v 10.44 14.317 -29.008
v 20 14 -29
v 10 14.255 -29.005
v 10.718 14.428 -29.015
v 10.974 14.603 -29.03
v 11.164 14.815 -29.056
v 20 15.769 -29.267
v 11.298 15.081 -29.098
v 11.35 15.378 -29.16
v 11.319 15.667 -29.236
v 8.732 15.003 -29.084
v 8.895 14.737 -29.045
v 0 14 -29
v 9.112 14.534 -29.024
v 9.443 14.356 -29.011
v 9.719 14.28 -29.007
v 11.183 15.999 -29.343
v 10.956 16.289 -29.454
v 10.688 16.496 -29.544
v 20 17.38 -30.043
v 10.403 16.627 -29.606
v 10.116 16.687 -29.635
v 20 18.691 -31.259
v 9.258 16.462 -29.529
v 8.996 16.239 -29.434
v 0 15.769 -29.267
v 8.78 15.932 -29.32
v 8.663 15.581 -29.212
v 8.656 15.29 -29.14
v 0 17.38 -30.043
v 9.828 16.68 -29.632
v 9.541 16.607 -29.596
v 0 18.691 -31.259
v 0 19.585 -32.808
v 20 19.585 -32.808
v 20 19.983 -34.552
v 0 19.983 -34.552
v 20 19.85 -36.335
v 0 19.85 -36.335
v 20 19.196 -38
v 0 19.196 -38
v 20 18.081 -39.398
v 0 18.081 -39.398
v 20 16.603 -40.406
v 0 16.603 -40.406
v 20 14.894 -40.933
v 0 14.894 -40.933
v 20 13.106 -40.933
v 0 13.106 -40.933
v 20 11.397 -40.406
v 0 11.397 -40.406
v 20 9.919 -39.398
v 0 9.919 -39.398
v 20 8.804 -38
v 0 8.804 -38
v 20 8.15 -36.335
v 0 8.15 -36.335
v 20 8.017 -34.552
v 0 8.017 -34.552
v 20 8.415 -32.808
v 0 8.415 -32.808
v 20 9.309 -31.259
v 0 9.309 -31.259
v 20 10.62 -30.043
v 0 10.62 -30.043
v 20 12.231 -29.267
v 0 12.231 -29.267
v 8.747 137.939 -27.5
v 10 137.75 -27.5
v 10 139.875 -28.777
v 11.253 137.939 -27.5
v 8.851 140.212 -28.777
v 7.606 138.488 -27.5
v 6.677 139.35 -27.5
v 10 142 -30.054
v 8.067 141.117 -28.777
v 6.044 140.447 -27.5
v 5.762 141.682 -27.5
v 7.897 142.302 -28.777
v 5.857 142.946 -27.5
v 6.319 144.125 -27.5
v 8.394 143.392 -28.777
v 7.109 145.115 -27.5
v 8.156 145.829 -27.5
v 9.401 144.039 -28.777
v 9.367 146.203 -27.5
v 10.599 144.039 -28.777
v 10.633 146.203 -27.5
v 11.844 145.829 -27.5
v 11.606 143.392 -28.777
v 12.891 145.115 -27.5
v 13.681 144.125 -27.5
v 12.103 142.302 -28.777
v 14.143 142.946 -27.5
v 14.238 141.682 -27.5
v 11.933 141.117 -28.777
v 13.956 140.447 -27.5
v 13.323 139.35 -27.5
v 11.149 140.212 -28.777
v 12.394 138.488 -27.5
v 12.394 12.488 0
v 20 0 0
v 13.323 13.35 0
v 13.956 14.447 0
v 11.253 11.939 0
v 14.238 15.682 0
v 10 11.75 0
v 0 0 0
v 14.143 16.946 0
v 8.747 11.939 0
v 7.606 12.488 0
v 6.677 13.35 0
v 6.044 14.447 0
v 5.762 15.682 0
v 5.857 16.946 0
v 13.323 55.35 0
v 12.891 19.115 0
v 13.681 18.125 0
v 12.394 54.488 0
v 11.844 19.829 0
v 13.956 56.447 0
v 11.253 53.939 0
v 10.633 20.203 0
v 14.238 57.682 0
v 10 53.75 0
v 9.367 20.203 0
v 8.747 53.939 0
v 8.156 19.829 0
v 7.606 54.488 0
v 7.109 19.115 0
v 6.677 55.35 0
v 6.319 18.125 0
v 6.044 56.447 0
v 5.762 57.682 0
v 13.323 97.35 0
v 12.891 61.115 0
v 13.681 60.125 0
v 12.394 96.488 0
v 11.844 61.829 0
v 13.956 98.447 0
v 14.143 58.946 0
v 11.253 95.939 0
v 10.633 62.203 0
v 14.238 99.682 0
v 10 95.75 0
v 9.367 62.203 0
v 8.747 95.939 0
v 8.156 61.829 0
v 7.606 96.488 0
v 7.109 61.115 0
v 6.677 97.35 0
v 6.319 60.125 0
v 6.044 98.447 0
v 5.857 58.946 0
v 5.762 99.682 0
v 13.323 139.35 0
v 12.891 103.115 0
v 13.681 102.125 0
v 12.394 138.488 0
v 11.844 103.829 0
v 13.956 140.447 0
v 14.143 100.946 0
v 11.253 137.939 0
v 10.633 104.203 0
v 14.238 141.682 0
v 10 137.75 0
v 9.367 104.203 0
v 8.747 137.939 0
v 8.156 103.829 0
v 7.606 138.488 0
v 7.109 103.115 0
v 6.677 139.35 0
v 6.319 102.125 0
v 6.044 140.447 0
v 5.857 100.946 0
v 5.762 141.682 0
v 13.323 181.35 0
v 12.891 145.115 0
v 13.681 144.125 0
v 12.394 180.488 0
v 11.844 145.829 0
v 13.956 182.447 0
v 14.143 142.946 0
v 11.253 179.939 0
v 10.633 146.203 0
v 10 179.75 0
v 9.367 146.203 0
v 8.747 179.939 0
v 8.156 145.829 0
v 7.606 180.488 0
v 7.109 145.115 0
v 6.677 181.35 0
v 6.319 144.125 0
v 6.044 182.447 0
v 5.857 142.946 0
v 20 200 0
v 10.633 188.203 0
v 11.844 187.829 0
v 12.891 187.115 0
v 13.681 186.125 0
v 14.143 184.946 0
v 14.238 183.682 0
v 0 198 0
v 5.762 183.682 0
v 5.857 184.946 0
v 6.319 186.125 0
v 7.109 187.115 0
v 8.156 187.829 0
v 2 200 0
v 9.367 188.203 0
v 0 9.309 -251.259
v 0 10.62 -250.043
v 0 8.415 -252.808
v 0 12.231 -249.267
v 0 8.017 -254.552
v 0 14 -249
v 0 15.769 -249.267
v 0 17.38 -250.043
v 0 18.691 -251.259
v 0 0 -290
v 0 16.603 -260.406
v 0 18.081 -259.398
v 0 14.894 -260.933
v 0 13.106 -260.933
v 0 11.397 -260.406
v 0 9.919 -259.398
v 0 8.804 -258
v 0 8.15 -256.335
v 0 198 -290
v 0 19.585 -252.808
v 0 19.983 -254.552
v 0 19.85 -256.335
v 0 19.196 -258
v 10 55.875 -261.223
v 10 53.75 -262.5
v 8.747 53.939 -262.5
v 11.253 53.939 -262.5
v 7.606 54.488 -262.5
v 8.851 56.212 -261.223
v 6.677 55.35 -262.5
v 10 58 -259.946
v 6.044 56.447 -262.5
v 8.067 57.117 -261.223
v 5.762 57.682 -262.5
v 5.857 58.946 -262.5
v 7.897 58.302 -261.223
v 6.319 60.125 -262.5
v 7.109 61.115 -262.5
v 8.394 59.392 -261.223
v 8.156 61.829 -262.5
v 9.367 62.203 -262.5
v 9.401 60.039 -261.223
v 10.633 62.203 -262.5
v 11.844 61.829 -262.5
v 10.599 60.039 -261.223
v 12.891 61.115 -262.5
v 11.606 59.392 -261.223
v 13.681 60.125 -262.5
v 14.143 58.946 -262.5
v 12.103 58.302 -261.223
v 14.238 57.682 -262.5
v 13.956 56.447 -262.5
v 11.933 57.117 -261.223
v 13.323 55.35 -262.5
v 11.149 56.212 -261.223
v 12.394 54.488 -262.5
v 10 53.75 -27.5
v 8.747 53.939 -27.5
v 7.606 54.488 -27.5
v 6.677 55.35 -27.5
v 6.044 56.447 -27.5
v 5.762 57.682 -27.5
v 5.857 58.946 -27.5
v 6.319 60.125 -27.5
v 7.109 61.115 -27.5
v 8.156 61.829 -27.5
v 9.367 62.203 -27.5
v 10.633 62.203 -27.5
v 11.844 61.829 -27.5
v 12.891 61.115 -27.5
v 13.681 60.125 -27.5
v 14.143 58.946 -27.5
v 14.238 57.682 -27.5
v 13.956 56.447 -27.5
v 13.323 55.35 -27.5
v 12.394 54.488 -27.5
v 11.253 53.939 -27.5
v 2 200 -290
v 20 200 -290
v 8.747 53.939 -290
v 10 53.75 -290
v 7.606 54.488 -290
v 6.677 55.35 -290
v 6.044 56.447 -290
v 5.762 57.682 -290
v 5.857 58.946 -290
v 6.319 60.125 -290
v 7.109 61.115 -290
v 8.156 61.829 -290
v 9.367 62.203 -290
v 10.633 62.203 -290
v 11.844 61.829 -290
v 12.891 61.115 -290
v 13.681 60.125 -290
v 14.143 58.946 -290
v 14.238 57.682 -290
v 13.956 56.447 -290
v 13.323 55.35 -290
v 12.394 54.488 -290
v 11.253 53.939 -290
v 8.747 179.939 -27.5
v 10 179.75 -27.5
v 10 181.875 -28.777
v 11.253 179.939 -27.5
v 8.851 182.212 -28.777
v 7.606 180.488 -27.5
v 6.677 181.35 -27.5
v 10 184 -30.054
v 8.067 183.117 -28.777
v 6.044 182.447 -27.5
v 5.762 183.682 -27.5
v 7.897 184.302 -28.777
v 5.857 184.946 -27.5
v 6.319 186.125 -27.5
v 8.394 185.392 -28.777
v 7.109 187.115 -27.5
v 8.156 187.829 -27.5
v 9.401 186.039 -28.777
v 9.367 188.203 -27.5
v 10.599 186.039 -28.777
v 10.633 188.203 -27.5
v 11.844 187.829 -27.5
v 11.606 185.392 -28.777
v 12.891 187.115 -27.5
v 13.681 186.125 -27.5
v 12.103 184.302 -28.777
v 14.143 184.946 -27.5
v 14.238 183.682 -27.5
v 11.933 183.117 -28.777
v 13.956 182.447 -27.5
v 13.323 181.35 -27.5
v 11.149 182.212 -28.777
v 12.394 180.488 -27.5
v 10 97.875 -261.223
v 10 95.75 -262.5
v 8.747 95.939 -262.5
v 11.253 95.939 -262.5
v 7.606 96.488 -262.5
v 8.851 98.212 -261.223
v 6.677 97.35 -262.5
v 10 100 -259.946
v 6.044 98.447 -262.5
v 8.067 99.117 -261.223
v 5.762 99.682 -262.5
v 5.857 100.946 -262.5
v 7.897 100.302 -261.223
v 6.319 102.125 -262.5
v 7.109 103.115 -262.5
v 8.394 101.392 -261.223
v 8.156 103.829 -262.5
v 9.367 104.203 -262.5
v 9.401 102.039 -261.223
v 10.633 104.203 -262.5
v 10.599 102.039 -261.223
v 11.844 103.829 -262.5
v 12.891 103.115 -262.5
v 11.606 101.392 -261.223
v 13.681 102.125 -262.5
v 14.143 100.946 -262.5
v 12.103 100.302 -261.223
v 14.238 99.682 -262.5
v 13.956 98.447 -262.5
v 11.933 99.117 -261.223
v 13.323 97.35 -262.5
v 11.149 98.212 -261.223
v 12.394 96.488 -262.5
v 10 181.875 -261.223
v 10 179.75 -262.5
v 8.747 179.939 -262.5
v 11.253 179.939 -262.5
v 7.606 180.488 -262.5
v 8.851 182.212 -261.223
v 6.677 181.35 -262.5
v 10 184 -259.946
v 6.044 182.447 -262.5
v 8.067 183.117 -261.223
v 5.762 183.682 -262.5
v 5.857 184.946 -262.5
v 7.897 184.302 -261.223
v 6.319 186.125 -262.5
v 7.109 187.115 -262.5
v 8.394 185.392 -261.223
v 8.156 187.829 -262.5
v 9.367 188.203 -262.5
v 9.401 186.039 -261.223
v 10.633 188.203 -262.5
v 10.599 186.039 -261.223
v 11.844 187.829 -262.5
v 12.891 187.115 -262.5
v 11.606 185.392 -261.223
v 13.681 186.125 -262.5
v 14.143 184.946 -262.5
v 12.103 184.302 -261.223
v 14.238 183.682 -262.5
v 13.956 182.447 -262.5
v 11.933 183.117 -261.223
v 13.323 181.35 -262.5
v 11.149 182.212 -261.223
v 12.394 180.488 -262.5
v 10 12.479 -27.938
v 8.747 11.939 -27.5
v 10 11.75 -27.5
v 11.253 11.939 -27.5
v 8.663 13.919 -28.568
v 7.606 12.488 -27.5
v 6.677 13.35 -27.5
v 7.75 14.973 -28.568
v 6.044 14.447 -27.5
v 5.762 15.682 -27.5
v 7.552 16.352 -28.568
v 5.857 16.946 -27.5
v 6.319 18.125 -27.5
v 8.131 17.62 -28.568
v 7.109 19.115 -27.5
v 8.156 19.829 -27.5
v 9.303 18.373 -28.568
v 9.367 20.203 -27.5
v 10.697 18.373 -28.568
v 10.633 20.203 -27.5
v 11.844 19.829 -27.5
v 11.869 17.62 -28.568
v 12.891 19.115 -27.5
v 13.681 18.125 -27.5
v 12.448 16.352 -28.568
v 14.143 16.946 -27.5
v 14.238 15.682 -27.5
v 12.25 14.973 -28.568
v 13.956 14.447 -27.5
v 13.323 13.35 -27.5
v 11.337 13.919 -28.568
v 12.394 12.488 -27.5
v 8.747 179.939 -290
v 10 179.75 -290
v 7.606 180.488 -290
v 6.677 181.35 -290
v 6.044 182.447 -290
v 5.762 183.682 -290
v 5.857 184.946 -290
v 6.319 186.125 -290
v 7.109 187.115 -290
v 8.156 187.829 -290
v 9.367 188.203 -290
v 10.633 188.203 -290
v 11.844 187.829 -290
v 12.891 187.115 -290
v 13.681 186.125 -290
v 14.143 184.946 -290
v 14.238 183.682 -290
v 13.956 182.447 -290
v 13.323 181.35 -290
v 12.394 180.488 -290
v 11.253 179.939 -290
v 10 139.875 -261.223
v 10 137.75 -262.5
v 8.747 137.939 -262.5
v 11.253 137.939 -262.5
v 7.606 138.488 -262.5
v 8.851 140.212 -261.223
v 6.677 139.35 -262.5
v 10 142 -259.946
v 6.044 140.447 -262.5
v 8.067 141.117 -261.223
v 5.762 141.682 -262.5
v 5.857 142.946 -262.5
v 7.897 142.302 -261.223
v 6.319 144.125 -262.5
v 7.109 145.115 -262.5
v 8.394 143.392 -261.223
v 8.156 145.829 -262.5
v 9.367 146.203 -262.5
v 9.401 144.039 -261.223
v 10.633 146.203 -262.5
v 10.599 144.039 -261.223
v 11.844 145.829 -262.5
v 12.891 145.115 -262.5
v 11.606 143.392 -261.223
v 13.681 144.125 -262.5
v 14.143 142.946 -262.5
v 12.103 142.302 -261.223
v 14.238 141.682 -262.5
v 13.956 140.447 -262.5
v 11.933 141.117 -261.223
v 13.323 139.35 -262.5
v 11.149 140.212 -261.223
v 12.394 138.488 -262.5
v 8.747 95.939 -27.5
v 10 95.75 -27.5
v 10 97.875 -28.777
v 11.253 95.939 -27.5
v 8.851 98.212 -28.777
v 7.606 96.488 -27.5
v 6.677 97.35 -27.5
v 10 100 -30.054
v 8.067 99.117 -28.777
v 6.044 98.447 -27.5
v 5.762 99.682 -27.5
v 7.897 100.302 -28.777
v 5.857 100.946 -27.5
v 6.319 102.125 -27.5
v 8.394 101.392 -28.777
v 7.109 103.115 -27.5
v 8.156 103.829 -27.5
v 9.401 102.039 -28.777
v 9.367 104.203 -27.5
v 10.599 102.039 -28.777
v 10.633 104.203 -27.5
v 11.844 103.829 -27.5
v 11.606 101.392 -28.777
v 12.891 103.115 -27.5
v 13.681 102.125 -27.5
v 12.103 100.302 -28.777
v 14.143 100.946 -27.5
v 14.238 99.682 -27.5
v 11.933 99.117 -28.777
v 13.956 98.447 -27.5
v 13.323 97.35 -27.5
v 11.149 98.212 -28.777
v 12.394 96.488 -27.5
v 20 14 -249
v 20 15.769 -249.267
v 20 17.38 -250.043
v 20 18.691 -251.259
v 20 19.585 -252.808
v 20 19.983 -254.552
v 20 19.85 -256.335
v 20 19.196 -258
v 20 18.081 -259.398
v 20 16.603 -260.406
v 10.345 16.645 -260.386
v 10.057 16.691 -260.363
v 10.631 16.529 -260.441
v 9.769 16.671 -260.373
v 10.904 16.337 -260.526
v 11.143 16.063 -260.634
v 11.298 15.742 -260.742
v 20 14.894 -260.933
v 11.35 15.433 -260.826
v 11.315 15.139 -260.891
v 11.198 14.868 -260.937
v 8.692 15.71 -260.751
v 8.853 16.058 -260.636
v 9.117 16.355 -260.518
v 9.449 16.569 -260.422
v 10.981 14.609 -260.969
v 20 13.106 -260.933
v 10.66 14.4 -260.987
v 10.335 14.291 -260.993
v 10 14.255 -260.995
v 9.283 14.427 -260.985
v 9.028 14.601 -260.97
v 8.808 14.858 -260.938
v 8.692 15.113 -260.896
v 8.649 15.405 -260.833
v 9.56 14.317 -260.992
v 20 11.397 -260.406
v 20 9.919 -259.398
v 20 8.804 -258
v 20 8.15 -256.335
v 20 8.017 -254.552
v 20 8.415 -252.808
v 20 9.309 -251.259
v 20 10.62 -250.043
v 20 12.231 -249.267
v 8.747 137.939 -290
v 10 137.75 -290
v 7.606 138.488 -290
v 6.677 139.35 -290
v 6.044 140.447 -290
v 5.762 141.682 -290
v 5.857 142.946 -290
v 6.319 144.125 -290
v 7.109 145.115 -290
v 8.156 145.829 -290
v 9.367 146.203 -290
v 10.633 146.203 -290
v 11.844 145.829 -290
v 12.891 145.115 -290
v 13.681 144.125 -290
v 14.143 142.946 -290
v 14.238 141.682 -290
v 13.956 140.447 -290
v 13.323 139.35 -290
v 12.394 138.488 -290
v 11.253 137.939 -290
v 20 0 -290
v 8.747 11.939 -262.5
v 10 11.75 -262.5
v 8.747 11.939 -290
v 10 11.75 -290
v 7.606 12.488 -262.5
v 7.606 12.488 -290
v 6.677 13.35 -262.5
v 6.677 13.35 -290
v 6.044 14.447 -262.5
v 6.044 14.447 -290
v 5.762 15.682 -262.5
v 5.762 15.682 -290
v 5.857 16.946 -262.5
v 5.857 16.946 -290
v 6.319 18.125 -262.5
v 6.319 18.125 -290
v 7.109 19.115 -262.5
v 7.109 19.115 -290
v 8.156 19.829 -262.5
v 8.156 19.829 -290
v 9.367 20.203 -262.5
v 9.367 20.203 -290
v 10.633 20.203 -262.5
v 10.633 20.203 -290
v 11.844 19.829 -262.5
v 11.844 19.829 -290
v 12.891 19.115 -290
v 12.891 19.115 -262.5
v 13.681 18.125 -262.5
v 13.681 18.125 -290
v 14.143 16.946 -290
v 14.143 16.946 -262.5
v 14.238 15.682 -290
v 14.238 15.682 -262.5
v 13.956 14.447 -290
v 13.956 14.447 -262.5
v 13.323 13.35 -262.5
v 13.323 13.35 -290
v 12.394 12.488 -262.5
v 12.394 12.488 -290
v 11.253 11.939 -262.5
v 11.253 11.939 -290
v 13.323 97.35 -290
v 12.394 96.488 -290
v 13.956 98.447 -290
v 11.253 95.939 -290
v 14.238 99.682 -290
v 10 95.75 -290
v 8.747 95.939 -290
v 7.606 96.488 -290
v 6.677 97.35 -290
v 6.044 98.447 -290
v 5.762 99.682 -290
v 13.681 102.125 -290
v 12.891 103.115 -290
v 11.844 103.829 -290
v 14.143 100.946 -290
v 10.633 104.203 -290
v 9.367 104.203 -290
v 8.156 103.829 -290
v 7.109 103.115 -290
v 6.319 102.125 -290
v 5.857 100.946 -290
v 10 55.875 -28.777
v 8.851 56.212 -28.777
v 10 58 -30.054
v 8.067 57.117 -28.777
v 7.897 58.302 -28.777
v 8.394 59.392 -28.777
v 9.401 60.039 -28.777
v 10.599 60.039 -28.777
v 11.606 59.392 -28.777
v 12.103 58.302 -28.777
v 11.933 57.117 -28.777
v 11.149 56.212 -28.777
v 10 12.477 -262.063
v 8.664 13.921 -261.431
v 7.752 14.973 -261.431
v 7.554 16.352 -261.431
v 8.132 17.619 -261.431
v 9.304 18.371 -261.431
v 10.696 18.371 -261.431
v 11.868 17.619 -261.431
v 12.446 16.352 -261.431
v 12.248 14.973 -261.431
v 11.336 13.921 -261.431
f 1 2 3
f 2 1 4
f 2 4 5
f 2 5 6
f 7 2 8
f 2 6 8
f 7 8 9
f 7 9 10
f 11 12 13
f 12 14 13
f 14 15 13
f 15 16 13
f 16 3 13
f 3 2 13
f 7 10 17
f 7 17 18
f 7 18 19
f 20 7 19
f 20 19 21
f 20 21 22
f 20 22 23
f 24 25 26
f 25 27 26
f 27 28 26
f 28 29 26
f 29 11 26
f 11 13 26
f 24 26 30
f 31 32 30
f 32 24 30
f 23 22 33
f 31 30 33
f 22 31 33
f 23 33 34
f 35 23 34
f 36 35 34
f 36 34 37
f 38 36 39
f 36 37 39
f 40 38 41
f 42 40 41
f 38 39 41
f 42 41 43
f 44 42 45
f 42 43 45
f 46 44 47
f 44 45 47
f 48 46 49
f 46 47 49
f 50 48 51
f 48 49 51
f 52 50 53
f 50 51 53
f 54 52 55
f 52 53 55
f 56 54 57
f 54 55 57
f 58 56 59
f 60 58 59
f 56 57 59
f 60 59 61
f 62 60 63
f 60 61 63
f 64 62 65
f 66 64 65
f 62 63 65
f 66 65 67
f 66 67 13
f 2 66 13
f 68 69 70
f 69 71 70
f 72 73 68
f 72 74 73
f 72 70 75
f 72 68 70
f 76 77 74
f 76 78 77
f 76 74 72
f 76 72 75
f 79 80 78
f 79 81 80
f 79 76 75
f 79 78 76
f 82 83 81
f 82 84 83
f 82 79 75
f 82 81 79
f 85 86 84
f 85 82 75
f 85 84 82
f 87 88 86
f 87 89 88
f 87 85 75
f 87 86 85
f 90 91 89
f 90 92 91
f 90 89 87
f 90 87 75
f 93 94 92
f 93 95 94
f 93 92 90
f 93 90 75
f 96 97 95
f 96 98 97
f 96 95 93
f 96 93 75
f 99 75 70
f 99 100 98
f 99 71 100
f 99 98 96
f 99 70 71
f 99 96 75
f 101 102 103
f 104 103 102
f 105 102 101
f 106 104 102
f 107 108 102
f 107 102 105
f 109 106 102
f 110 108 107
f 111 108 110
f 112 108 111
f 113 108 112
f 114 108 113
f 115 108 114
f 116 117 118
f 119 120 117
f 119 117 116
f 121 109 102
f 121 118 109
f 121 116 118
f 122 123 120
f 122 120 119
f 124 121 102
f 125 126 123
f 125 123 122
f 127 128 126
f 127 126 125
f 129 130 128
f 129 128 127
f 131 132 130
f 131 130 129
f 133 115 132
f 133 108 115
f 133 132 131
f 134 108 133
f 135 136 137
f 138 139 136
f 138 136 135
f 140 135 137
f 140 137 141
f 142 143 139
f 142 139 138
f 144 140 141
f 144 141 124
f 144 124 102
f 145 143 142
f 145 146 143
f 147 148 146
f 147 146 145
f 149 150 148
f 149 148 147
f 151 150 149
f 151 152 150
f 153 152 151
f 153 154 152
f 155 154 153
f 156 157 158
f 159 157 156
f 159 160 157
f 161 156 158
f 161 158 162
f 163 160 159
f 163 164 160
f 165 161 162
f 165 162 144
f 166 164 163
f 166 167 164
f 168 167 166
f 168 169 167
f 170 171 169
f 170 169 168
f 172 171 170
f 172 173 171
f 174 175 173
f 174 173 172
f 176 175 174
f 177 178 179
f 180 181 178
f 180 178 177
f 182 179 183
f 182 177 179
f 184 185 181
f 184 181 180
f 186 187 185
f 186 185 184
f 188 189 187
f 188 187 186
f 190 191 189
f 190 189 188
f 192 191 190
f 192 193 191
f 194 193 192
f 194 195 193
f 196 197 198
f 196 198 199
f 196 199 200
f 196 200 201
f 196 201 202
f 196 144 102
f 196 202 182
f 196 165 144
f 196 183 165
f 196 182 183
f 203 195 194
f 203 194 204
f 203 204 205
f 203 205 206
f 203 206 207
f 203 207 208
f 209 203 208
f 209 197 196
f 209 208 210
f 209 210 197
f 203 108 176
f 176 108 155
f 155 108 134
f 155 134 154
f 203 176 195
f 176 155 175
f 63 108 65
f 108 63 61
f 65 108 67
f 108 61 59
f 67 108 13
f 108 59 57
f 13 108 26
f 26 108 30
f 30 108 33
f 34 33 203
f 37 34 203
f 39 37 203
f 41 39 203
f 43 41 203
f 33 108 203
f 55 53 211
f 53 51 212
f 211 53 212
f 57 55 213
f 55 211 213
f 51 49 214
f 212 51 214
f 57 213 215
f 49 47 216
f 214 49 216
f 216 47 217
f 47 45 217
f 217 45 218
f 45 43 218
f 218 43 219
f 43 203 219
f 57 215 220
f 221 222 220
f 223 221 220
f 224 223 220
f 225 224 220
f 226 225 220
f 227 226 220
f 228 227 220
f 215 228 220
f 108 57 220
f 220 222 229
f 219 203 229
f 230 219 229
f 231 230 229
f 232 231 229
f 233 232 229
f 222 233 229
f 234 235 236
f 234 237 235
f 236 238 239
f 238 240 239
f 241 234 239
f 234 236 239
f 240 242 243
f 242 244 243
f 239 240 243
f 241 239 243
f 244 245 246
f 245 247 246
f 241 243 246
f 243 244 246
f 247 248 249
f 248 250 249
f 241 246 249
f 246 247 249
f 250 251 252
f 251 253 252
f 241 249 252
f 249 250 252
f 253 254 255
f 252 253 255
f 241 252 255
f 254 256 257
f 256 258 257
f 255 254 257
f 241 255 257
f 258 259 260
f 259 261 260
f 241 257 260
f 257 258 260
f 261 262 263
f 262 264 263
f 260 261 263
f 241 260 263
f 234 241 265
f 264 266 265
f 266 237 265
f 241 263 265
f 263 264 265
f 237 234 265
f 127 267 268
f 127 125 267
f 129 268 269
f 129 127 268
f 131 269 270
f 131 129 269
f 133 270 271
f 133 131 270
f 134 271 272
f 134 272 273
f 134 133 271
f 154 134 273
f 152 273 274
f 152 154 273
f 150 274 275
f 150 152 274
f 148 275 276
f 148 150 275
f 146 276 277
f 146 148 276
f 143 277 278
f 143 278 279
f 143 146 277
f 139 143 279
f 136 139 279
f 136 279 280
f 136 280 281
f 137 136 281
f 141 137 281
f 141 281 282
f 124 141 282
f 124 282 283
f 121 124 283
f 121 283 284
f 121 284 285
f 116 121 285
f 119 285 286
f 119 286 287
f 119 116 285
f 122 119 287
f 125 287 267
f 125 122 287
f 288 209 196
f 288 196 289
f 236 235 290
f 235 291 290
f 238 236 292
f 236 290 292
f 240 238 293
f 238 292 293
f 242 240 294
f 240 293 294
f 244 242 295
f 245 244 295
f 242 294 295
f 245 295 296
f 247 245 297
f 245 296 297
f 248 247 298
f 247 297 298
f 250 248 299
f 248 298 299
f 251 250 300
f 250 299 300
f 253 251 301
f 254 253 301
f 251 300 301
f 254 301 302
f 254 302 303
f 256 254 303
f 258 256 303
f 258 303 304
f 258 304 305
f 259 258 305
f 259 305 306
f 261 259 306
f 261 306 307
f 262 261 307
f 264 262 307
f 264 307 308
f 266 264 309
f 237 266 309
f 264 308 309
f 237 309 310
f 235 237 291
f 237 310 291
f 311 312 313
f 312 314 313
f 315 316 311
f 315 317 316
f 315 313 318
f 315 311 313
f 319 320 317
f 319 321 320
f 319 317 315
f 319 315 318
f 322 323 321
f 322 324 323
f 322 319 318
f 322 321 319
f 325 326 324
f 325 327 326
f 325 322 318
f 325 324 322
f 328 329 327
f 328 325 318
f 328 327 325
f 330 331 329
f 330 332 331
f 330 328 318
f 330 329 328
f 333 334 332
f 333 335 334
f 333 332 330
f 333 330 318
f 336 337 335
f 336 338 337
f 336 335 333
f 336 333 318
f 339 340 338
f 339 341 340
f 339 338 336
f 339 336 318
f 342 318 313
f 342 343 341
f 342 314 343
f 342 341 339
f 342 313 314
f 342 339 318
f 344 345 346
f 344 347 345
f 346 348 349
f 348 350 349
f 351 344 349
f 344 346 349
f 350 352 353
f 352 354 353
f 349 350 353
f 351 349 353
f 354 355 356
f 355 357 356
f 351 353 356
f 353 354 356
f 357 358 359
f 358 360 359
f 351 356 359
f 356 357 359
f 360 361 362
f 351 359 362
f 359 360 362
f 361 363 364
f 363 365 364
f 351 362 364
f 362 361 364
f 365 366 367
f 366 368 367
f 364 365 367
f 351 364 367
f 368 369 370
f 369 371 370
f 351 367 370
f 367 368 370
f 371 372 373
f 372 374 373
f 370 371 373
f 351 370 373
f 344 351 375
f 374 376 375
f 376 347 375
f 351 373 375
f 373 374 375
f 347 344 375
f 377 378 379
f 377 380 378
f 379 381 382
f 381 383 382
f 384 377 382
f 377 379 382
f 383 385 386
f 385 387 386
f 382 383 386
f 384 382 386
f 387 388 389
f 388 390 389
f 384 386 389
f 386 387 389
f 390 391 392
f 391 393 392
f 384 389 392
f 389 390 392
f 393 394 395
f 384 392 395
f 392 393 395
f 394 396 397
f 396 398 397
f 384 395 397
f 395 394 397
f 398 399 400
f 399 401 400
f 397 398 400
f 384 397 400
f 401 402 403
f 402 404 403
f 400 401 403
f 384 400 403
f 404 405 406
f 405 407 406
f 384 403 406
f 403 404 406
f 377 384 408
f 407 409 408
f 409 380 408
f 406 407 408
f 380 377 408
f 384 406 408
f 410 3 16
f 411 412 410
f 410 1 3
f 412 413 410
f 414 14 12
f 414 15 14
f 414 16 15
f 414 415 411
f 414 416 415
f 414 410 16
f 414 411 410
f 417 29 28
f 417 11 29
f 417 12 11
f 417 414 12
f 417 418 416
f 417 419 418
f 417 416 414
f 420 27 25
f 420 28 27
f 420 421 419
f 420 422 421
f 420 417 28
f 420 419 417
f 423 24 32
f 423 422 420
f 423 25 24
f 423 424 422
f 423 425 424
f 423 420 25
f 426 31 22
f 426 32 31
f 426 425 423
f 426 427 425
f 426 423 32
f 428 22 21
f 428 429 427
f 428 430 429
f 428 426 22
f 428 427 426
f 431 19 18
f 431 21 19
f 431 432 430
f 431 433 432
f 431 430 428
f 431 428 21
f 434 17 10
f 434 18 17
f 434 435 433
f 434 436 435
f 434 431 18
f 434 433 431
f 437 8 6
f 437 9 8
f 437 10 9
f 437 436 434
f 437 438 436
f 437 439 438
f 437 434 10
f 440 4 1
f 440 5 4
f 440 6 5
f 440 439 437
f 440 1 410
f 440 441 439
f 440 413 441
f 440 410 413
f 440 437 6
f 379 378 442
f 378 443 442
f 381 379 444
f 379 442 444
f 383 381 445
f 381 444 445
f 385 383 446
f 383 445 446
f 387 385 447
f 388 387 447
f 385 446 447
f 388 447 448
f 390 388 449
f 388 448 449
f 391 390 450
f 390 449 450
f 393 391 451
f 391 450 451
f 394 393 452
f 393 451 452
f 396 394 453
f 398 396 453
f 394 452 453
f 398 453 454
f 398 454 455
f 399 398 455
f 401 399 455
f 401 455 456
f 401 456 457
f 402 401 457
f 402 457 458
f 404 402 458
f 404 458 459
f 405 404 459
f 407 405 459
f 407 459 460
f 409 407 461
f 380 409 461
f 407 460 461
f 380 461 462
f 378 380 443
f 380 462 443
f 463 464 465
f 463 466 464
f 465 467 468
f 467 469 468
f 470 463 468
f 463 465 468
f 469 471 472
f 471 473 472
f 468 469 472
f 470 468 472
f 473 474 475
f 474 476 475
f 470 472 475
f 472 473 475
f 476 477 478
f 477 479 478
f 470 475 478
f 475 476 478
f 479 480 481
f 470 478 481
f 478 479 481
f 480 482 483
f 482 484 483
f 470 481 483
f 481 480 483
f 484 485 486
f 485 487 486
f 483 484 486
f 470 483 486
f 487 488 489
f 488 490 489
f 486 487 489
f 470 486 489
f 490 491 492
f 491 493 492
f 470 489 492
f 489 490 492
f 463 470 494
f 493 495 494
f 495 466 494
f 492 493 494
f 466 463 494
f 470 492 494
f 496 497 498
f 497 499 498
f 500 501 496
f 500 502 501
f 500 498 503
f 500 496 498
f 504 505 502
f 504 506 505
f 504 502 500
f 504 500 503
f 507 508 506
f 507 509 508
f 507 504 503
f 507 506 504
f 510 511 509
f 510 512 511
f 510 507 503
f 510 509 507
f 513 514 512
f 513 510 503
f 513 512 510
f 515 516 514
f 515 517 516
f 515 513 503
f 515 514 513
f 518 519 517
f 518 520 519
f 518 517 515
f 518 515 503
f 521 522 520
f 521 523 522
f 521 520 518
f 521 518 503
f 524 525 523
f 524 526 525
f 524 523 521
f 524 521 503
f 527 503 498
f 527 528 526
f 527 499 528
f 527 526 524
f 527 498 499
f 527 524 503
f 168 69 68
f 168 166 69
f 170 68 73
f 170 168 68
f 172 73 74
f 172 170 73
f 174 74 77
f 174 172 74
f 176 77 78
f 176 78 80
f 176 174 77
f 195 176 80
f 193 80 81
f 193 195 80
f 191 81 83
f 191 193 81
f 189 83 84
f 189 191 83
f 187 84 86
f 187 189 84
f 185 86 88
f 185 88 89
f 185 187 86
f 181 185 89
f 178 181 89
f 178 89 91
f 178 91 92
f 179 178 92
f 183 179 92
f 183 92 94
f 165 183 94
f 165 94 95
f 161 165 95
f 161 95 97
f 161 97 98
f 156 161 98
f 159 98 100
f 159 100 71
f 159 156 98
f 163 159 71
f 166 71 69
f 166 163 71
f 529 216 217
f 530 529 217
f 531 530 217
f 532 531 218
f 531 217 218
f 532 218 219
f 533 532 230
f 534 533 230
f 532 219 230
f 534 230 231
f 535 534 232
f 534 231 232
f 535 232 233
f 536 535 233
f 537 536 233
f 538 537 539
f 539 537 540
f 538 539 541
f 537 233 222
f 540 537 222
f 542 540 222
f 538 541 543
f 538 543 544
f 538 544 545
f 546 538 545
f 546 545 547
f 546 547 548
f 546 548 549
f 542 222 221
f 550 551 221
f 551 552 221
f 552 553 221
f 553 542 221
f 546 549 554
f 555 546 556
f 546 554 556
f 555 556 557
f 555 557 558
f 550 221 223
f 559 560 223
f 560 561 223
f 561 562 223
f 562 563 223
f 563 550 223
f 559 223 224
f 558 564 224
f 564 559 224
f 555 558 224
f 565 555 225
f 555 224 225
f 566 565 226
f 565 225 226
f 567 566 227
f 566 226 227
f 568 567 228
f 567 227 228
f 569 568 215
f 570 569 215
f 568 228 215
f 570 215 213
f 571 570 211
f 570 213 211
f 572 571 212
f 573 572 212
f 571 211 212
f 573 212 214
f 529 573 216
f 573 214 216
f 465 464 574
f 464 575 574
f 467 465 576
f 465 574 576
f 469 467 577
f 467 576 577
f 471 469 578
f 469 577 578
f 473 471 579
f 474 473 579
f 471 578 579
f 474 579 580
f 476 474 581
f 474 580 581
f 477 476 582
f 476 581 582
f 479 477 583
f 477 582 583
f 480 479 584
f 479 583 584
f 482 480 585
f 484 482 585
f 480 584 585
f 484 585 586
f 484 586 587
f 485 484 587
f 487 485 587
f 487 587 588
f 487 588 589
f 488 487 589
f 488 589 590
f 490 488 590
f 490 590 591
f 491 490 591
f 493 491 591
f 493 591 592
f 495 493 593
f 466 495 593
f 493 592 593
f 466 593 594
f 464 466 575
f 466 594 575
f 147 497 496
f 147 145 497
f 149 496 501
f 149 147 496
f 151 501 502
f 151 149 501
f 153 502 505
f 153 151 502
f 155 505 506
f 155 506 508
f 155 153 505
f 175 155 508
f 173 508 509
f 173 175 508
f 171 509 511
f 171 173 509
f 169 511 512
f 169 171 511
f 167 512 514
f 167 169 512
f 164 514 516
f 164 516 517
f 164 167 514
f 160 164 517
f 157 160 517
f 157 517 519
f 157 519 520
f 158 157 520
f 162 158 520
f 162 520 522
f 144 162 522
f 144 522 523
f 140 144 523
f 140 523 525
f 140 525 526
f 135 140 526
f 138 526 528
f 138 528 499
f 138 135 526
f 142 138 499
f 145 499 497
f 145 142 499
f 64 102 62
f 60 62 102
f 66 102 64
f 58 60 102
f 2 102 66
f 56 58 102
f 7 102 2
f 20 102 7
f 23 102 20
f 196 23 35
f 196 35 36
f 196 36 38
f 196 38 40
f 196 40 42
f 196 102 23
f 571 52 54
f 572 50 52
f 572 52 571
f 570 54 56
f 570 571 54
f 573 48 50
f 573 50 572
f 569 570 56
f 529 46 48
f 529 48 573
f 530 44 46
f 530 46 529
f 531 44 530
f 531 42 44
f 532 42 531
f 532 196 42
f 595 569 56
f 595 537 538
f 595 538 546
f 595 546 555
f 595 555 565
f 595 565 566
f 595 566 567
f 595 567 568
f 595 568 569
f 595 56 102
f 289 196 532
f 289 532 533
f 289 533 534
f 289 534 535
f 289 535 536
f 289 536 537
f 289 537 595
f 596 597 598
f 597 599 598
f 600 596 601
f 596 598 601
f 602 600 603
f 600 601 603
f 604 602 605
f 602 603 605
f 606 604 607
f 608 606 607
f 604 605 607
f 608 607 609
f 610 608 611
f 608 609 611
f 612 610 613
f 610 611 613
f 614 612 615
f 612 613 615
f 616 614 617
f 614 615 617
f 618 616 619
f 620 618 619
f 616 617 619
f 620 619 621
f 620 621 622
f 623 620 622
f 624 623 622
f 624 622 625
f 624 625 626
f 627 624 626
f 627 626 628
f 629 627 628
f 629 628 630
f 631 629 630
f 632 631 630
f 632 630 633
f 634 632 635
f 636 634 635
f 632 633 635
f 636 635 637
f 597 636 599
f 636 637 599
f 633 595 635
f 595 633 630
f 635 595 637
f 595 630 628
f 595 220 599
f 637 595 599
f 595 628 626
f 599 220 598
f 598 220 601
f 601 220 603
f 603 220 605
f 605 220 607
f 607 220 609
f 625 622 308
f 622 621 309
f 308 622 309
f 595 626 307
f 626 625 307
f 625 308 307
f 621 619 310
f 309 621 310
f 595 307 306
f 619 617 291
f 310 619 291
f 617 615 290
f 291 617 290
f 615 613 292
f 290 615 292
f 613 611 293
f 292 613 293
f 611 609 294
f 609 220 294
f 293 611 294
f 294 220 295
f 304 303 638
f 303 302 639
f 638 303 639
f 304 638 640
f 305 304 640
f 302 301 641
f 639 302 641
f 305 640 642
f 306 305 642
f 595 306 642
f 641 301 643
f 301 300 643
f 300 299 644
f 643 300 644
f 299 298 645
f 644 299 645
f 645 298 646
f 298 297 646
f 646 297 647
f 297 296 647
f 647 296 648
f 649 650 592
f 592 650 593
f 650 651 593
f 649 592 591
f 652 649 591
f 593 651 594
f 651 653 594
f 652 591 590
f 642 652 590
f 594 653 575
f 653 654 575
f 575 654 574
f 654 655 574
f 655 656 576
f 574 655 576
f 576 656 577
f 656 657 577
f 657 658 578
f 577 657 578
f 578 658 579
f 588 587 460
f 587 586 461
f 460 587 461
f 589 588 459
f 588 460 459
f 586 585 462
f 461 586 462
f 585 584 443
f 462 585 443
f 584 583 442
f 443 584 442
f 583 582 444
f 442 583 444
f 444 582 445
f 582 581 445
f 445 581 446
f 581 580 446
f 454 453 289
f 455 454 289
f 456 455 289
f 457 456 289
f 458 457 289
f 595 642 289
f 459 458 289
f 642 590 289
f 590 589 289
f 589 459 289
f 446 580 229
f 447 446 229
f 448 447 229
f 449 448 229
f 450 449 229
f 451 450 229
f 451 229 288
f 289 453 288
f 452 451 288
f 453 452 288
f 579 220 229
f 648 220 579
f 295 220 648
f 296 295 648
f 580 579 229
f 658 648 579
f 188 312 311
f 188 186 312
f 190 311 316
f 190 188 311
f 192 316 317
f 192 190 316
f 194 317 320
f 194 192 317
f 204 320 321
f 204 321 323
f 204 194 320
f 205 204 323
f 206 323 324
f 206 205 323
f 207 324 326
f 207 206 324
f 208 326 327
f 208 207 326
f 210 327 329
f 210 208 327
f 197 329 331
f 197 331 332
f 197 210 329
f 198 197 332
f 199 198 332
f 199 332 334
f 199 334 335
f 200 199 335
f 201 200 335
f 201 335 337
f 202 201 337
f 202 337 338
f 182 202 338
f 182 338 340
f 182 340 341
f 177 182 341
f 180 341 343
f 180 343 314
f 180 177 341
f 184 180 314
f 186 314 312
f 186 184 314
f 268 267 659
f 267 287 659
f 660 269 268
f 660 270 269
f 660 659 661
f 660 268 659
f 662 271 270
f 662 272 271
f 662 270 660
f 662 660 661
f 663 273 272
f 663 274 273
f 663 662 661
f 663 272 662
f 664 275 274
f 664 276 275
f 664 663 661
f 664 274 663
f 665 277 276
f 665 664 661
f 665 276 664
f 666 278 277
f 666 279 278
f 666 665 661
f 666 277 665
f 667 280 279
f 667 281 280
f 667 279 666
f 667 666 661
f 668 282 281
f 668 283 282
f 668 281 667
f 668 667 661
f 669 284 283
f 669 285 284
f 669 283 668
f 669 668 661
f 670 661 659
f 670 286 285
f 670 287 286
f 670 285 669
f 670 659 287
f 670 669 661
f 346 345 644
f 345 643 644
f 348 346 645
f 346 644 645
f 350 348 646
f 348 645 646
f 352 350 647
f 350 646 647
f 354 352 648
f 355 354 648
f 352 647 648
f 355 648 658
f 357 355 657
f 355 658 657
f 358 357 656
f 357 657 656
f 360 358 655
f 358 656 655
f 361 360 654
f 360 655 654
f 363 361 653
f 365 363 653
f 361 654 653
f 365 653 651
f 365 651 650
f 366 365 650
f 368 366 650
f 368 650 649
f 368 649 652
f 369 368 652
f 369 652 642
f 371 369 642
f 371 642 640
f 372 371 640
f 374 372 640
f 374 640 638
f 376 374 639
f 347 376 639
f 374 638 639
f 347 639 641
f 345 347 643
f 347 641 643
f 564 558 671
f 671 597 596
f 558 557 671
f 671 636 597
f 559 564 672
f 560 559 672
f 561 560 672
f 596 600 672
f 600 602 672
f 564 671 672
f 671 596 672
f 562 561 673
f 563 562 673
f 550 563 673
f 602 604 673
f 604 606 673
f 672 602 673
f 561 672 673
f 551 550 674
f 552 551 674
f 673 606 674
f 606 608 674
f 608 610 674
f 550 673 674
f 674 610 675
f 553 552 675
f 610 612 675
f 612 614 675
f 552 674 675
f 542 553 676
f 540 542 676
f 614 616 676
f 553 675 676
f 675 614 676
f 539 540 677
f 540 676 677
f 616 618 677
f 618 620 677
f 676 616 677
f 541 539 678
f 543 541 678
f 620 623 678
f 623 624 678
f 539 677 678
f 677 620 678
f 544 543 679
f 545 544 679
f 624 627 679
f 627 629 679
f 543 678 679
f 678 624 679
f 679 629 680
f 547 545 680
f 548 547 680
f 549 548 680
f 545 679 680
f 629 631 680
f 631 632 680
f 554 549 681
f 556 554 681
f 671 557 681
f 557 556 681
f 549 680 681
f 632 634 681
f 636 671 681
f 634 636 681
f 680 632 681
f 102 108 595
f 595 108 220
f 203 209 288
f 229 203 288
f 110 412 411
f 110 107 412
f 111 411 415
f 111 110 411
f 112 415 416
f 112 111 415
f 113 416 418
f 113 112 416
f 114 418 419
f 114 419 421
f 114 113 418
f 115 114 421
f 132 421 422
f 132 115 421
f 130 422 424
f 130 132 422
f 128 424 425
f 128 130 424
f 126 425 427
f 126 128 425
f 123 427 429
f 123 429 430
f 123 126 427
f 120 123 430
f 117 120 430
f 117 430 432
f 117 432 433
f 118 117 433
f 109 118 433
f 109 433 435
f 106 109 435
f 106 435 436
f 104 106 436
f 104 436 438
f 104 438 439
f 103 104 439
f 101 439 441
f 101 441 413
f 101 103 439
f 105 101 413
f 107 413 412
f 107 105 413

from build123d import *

# Parameters (mm, degrees)
SCHIZZO1_W                  = 290
SCHIZZO1_H                  = 200
ESTRUSIONE1_DEPTH           = 20
M10_TAPPED_HOLE1_AT_2_COUNT = 2
M10_TAPPED_HOLE1_AT_2_PITCH = 168
M10_TAPPED_HOLE1_AT_3_COUNT = 2
M10_TAPPED_HOLE1_AT_3_PITCH = 126
M10_TAPPED_HOLE1_AT_4_COUNT = 2
M10_TAPPED_HOLE1_AT_4_PITCH = 42
M10_TAPPED_HOLE1_AT_5_COUNT = 2
M10_TAPPED_HOLE1_AT_5_PITCH = 84
M14_TAPPED_HOLE1_D          = 12
M14_TAPPED_HOLE1_DEPTH      = 38
M14_TAPPED_HOLE1_TIP        = 3.605163714
SMUSSO1_SIZE                = 2


with BuildPart() as part:
    # Schizzo1 → Estrusione1 (new body)
    with BuildSketch(Plane(origin=(0, 0, 0), x_dir=(0, 0, -1), z_dir=(1, 0, 0))):
        with Locations((145, 100)):
            Rectangle(SCHIZZO1_W, SCHIZZO1_H)
    extrude(amount=ESTRUSIONE1_DEPTH)

    # Schizzo2 → M10 Tapped Hole1 (revolve, cut)
    with BuildSketch(Plane(origin=(10, 184, 0), x_dir=(0, -1, 0), z_dir=(1, 0, 0))):
        Polygon((0, 0), (0, 30.053657631), (4.25, 27.5), (4.25, 0), align=None)
    m10_tapped_hole1 = revolve(axis=Axis((10, 184, 6.35), (0, 0, -1)), mode=Mode.SUBTRACT)

    # M10 Tapped Hole1 at 2: M10 Tapped Hole1 ×2
    with Locations(*[(0, -i * M10_TAPPED_HOLE1_AT_2_PITCH, 0) for i in range(1, M10_TAPPED_HOLE1_AT_2_COUNT)]):
        add(m10_tapped_hole1, mode=Mode.SUBTRACT)

    # M10 Tapped Hole1 at 3: M10 Tapped Hole1 ×2
    with Locations(*[(0, -i * M10_TAPPED_HOLE1_AT_3_PITCH, 0) for i in range(1, M10_TAPPED_HOLE1_AT_3_COUNT)]):
        add(m10_tapped_hole1, mode=Mode.SUBTRACT)

    # M10 Tapped Hole1 at 4: M10 Tapped Hole1 ×2
    with Locations(*[(0, -i * M10_TAPPED_HOLE1_AT_4_PITCH, 0) for i in range(1, M10_TAPPED_HOLE1_AT_4_COUNT)]):
        add(m10_tapped_hole1, mode=Mode.SUBTRACT)

    # M10 Tapped Hole1 at 5: M10 Tapped Hole1 ×2
    with Locations(*[(0, -i * M10_TAPPED_HOLE1_AT_5_PITCH, 0) for i in range(1, M10_TAPPED_HOLE1_AT_5_COUNT)]):
        add(m10_tapped_hole1, mode=Mode.SUBTRACT)

    # Specchia1: M10 Tapped Hole1 across plane
    add(m10_tapped_hole1.mirror(Plane.XY.offset(-145)), mode=Mode.SUBTRACT)

    # Specchia1 copy 1 sketch → Specchia1 copy 1 (revolve, cut)
    with BuildSketch(Plane(origin=(10, 16, -290), x_dir=(0, -1, 0), z_dir=(1, 0, 0))):
        Polygon((0, 0), (0, -30.053657631), (4.25, -27.5), (4.25, 0), align=None)
    revolve(axis=Axis((10, 16, -296.35), (0, 0, -1)), mode=Mode.SUBTRACT)

    # Specchia1 copy 2 sketch → Specchia1 copy 2 (revolve, cut)
    with BuildSketch(Plane(origin=(10, 58, -290), x_dir=(0, -1, 0), z_dir=(1, 0, 0))):
        Polygon((0, 0), (0, -30.053657631), (4.25, -27.5), (4.25, 0), align=None)
    revolve(axis=Axis((10, 58, -296.35), (0, 0, -1)), mode=Mode.SUBTRACT)

    # Specchia1 copy 3 sketch → Specchia1 copy 3 (revolve, cut)
    with BuildSketch(Plane(origin=(10, 142, -290), x_dir=(0, -1, 0), z_dir=(1, 0, 0))):
        Polygon((0, 0), (0, -30.053657631), (4.25, -27.5), (4.25, 0), align=None)
    revolve(axis=Axis((10, 142, -296.35), (0, 0, -1)), mode=Mode.SUBTRACT)

    # Specchia1 copy 4 sketch → Specchia1 copy 4 (revolve, cut)
    with BuildSketch(Plane(origin=(10, 100, -290), x_dir=(0, -1, 0), z_dir=(1, 0, 0))):
        Polygon((0, 0), (0, -30.053657631), (4.25, -27.5), (4.25, 0), align=None)
    revolve(axis=Axis((10, 100, -296.35), (0, 0, -1)), mode=Mode.SUBTRACT)

    # M14 Tapped Hole1
    with Locations(Plane(origin=(20, 0, 0), x_dir=(0, 0, -1), z_dir=(1, 0, 0))):
        with Locations((35, 14), (255, 14)):
            Hole(M14_TAPPED_HOLE1_D / 2, depth=M14_TAPPED_HOLE1_DEPTH)
            with Locations((0, 0, -(M14_TAPPED_HOLE1_DEPTH + M14_TAPPED_HOLE1_TIP / 2))):  # 118° drill point
                Cone(0, M14_TAPPED_HOLE1_D / 2, M14_TAPPED_HOLE1_TIP, mode=Mode.SUBTRACT)

    # Smusso1
    smusso1_edges = [part.edges().sort_by_distance(p)[0] for p in [
        (0, 200, -145),
    ]]
    chamfer(smusso1_edges, length=SMUSSO1_SIZE)


solid = part.part
